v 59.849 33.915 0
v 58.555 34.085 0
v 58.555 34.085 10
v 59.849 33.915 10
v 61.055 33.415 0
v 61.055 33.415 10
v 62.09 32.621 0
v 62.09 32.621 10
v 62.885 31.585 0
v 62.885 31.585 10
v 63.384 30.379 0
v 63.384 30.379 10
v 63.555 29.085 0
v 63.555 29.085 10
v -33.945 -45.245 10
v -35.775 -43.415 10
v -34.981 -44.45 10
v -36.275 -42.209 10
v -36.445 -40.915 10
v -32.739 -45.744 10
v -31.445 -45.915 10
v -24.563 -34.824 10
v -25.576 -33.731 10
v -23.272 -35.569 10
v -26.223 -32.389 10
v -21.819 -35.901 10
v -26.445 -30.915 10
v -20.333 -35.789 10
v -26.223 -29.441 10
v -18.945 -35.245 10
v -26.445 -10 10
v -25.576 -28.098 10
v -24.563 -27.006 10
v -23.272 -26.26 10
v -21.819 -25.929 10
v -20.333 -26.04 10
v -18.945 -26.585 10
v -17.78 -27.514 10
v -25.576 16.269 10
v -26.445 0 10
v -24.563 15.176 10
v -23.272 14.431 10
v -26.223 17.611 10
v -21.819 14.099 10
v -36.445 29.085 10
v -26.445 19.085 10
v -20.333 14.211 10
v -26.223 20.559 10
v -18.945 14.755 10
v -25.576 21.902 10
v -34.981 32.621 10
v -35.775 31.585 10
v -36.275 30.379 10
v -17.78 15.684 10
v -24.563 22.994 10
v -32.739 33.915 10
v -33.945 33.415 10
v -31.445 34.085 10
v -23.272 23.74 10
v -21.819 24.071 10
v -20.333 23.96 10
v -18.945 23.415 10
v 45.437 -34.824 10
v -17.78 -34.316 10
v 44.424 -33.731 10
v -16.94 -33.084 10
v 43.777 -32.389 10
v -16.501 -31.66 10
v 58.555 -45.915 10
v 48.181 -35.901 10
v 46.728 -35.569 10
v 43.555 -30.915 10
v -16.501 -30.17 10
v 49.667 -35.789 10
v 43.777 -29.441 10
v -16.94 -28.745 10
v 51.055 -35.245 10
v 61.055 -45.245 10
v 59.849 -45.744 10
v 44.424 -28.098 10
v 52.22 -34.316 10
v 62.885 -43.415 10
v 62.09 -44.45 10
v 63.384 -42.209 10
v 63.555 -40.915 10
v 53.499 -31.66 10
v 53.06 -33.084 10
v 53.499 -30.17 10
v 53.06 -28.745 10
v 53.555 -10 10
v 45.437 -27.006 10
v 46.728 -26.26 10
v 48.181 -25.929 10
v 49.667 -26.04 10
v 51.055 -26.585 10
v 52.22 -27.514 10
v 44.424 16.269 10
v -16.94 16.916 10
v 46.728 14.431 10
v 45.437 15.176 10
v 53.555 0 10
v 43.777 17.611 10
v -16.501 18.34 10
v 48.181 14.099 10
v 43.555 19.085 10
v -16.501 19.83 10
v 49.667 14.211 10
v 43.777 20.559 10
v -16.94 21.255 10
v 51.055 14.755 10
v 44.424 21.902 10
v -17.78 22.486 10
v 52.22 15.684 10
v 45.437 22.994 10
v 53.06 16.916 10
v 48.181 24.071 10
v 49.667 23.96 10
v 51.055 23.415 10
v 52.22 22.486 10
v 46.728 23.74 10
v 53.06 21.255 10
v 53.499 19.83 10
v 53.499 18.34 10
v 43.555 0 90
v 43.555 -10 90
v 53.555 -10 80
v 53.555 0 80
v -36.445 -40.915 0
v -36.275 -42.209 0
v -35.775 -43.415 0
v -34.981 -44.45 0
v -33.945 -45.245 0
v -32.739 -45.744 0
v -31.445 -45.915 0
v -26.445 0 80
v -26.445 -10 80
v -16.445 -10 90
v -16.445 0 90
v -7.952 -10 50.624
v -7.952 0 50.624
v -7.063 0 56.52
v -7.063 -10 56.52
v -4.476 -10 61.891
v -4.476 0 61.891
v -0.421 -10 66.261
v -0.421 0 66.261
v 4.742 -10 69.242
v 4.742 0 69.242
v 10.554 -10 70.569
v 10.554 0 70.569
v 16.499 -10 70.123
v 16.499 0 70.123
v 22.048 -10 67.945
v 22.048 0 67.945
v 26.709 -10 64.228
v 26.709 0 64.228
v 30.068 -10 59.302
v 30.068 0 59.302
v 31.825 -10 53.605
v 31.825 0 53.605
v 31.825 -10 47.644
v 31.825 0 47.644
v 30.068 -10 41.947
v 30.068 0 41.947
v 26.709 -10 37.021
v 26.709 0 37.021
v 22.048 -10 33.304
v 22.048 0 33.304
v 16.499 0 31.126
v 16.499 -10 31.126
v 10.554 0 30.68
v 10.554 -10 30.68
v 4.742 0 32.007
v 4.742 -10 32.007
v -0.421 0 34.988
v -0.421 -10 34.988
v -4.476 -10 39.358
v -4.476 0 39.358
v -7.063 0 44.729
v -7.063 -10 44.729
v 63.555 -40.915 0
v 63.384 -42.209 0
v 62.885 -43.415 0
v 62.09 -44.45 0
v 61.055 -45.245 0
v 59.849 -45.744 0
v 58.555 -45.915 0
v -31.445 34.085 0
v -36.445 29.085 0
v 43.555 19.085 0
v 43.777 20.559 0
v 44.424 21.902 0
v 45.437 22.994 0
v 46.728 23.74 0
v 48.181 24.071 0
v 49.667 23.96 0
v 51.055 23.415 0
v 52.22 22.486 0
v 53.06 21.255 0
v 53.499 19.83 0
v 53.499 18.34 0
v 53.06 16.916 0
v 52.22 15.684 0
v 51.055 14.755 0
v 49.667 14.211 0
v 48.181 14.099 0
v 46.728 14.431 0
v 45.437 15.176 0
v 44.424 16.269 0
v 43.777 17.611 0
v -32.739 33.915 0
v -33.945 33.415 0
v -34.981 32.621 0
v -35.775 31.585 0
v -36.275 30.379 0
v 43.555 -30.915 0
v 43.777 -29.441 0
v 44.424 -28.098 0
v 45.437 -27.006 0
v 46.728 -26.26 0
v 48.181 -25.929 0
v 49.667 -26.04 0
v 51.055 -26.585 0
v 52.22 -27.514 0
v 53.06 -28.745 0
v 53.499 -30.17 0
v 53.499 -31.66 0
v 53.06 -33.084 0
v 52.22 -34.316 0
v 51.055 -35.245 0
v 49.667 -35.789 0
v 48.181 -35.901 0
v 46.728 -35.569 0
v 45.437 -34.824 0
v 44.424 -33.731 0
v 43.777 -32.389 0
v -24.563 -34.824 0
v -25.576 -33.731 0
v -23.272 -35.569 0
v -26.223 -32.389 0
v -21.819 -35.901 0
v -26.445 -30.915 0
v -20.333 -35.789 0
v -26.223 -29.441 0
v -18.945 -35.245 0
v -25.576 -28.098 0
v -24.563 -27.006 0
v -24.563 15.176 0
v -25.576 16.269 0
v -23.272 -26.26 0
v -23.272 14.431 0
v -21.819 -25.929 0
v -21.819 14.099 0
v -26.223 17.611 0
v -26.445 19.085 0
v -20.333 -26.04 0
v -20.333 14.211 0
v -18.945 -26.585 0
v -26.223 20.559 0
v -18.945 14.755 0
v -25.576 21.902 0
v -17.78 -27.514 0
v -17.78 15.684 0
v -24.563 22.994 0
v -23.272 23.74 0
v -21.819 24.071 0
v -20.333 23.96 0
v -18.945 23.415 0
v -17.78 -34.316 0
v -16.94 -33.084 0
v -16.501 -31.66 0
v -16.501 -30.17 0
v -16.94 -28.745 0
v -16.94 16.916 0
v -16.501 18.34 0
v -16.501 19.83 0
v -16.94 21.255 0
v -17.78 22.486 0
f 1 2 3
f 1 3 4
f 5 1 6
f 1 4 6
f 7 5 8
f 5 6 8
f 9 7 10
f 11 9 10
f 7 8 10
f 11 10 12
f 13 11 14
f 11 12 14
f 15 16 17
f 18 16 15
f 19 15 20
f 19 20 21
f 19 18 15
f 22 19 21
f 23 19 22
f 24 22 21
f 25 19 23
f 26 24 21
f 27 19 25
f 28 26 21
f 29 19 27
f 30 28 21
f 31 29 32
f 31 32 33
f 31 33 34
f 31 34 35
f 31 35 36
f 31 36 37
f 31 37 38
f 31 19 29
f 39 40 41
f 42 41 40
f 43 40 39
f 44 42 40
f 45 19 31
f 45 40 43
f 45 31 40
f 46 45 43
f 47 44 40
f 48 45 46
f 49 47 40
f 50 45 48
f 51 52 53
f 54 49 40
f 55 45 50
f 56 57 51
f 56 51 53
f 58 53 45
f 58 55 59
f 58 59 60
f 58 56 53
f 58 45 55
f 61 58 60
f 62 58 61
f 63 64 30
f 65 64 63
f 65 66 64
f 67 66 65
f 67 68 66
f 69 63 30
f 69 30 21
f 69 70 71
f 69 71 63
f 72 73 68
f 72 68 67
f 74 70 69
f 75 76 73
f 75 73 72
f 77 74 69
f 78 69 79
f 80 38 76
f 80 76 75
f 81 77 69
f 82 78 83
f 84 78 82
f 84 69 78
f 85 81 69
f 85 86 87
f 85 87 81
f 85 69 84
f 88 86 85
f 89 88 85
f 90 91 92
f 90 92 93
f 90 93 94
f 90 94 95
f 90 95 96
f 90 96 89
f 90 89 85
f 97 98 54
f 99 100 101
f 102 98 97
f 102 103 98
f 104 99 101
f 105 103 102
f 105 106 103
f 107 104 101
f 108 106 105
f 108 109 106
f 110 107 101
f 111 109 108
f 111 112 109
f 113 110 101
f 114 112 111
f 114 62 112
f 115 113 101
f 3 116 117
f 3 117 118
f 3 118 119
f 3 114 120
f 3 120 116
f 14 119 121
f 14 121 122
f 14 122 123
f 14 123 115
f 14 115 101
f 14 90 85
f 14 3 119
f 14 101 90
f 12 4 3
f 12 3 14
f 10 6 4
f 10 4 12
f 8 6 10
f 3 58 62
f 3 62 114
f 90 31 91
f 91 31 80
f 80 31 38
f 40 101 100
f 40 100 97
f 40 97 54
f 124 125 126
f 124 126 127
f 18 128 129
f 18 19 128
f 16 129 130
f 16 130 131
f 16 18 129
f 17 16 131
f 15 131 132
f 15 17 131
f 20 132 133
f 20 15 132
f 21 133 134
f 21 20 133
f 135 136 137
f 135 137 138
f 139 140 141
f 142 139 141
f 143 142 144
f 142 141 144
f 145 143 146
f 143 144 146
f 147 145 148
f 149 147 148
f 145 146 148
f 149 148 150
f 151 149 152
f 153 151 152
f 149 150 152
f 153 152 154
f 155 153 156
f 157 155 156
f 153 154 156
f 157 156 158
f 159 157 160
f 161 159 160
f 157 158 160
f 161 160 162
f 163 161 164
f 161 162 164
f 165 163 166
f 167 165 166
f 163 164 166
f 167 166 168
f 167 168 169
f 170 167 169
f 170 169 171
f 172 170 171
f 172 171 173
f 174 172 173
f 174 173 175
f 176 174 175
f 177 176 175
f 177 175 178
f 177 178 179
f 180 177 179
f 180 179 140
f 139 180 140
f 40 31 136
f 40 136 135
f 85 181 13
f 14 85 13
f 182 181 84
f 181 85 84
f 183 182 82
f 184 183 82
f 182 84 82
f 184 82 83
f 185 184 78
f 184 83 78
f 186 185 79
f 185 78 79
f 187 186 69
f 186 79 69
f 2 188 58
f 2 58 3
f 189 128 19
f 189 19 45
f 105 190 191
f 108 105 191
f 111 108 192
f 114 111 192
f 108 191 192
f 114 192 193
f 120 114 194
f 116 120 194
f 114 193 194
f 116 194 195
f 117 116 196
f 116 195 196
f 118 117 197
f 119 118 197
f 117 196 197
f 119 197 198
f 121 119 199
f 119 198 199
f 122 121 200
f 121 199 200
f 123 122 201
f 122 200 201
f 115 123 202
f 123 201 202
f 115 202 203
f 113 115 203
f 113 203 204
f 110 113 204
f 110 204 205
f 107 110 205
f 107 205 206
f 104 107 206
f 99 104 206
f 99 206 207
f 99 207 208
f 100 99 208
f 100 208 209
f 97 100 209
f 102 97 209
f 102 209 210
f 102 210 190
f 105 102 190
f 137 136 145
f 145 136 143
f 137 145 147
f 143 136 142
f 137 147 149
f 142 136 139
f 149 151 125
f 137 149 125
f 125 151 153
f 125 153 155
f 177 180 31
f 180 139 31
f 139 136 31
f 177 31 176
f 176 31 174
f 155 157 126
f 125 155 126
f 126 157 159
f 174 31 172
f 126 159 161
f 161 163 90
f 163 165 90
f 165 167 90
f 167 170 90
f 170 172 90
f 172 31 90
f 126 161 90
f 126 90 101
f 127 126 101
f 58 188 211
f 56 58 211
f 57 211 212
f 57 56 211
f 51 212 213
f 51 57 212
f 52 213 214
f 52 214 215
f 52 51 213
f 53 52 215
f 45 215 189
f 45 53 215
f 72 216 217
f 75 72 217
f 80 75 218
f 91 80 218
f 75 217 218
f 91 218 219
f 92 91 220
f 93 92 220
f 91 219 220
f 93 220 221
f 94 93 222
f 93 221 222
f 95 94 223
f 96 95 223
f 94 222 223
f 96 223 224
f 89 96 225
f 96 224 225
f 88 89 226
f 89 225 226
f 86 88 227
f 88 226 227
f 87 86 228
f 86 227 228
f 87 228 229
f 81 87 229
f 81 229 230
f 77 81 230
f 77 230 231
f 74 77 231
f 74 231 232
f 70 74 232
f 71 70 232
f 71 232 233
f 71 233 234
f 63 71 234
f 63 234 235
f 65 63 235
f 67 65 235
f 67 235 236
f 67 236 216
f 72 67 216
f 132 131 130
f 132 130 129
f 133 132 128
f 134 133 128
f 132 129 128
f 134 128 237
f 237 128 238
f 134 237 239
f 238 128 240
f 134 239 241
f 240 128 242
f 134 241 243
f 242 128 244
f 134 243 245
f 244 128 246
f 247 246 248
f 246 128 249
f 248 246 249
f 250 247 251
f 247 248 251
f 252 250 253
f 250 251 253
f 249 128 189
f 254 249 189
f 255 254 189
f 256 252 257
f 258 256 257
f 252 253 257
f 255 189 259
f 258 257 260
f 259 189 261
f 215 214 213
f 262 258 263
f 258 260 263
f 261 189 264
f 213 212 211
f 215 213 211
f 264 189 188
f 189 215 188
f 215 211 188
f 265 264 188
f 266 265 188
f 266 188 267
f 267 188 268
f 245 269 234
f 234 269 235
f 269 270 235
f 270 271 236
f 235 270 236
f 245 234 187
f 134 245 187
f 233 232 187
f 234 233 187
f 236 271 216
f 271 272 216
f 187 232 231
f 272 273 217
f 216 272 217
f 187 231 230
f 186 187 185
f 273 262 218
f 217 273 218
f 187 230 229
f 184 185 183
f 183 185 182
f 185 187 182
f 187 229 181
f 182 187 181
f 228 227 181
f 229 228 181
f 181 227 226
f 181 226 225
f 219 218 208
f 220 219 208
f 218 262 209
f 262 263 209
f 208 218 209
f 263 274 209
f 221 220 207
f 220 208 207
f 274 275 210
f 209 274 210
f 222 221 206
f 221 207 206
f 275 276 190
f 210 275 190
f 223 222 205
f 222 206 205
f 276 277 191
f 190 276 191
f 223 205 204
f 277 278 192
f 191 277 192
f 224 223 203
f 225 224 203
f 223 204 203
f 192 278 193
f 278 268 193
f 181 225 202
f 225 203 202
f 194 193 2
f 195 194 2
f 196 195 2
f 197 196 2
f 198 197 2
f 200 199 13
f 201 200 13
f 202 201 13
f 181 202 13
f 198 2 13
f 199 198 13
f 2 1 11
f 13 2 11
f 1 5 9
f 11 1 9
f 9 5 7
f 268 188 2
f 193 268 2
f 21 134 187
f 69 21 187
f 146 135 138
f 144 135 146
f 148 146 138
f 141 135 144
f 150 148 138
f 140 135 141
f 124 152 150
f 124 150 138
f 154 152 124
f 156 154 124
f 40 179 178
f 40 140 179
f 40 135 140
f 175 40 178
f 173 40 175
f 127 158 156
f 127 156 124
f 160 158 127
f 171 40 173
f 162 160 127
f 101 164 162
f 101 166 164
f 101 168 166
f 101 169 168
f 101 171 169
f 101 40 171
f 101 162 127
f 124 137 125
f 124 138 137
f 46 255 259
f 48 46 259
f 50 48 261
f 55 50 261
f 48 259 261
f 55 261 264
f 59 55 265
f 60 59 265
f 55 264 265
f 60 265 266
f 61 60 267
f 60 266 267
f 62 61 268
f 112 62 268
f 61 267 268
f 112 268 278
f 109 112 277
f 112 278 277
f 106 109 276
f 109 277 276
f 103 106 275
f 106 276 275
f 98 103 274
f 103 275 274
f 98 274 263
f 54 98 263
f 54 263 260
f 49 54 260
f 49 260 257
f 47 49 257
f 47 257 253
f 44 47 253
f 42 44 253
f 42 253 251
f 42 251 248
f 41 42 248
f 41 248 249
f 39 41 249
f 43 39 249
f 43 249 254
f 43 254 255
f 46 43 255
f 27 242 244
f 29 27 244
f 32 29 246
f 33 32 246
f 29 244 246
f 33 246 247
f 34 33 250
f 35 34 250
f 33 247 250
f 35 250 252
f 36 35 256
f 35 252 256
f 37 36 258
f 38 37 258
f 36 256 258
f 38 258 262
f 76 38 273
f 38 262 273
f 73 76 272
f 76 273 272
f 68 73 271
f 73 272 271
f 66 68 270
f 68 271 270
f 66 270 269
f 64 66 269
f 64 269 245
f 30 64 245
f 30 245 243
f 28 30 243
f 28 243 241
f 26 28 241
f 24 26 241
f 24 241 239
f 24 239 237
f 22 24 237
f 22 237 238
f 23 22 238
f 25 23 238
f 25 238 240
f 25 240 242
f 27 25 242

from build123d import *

# Parameters (mm, degrees)
F0_W     = 100
F0_H     = 80
F1_DEPTH = 10
F3_D     = 10
F4_R     = 5
F5_R     = 5
F6_W     = 80
F6_H     = 10
F7_DEPTH = 80
F8_SIZE  = 10
F10_D    = 40


with BuildPart() as f1:
    # F0 (on Top) → F1 (new body)
    with BuildSketch(Plane.XY):
        with Locations((13.55473, -5.91478)):
            Rectangle(F0_W, F0_H)
    extrude(amount=F1_DEPTH)

    # F3 (through all)
    with Locations(Plane.XY.offset(10)):
        with Locations((-21.44527, -30.91478), (-21.44527, 19.08522), (48.55473, 19.08522), (48.55473, -30.91478)):
            Hole(F3_D / 2)

    # F4
    f4_edges = [f1.edges().sort_by_distance(p)[0] for p in [
        (63.55473, 34.08522, 5),
    ]]
    fillet(f4_edges, radius=F4_R)

    # F5
    f5_edges = [f1.edges().sort_by_distance(p)[0] for p in [
        (63.55473, -45.91478, 5),
        (-36.44527, -45.91478, 5),
        (-36.44527, 34.08522, 5),
    ]]
    fillet(f5_edges, radius=F5_R)

    # F6 (on face) → F7 (join)
    with BuildSketch(Plane.XY.offset(10)):
        with Locations((13.55473, -5)):
            Rectangle(F6_W, F6_H)
    extrude(amount=F7_DEPTH)

    # F8
    f8_edges = [f1.edges().sort_by_distance(p)[0] for p in [
        (53.55473, -5, 90),
        (-26.44527, -5, 90),
    ]]
    chamfer(f8_edges, length=F8_SIZE)

    # F10 (through all)
    with Locations(Plane.XZ.offset(10)):
        with Locations((12.048366, 50.624441)):
            Hole(F10_D / 2)


solid = f1.part
